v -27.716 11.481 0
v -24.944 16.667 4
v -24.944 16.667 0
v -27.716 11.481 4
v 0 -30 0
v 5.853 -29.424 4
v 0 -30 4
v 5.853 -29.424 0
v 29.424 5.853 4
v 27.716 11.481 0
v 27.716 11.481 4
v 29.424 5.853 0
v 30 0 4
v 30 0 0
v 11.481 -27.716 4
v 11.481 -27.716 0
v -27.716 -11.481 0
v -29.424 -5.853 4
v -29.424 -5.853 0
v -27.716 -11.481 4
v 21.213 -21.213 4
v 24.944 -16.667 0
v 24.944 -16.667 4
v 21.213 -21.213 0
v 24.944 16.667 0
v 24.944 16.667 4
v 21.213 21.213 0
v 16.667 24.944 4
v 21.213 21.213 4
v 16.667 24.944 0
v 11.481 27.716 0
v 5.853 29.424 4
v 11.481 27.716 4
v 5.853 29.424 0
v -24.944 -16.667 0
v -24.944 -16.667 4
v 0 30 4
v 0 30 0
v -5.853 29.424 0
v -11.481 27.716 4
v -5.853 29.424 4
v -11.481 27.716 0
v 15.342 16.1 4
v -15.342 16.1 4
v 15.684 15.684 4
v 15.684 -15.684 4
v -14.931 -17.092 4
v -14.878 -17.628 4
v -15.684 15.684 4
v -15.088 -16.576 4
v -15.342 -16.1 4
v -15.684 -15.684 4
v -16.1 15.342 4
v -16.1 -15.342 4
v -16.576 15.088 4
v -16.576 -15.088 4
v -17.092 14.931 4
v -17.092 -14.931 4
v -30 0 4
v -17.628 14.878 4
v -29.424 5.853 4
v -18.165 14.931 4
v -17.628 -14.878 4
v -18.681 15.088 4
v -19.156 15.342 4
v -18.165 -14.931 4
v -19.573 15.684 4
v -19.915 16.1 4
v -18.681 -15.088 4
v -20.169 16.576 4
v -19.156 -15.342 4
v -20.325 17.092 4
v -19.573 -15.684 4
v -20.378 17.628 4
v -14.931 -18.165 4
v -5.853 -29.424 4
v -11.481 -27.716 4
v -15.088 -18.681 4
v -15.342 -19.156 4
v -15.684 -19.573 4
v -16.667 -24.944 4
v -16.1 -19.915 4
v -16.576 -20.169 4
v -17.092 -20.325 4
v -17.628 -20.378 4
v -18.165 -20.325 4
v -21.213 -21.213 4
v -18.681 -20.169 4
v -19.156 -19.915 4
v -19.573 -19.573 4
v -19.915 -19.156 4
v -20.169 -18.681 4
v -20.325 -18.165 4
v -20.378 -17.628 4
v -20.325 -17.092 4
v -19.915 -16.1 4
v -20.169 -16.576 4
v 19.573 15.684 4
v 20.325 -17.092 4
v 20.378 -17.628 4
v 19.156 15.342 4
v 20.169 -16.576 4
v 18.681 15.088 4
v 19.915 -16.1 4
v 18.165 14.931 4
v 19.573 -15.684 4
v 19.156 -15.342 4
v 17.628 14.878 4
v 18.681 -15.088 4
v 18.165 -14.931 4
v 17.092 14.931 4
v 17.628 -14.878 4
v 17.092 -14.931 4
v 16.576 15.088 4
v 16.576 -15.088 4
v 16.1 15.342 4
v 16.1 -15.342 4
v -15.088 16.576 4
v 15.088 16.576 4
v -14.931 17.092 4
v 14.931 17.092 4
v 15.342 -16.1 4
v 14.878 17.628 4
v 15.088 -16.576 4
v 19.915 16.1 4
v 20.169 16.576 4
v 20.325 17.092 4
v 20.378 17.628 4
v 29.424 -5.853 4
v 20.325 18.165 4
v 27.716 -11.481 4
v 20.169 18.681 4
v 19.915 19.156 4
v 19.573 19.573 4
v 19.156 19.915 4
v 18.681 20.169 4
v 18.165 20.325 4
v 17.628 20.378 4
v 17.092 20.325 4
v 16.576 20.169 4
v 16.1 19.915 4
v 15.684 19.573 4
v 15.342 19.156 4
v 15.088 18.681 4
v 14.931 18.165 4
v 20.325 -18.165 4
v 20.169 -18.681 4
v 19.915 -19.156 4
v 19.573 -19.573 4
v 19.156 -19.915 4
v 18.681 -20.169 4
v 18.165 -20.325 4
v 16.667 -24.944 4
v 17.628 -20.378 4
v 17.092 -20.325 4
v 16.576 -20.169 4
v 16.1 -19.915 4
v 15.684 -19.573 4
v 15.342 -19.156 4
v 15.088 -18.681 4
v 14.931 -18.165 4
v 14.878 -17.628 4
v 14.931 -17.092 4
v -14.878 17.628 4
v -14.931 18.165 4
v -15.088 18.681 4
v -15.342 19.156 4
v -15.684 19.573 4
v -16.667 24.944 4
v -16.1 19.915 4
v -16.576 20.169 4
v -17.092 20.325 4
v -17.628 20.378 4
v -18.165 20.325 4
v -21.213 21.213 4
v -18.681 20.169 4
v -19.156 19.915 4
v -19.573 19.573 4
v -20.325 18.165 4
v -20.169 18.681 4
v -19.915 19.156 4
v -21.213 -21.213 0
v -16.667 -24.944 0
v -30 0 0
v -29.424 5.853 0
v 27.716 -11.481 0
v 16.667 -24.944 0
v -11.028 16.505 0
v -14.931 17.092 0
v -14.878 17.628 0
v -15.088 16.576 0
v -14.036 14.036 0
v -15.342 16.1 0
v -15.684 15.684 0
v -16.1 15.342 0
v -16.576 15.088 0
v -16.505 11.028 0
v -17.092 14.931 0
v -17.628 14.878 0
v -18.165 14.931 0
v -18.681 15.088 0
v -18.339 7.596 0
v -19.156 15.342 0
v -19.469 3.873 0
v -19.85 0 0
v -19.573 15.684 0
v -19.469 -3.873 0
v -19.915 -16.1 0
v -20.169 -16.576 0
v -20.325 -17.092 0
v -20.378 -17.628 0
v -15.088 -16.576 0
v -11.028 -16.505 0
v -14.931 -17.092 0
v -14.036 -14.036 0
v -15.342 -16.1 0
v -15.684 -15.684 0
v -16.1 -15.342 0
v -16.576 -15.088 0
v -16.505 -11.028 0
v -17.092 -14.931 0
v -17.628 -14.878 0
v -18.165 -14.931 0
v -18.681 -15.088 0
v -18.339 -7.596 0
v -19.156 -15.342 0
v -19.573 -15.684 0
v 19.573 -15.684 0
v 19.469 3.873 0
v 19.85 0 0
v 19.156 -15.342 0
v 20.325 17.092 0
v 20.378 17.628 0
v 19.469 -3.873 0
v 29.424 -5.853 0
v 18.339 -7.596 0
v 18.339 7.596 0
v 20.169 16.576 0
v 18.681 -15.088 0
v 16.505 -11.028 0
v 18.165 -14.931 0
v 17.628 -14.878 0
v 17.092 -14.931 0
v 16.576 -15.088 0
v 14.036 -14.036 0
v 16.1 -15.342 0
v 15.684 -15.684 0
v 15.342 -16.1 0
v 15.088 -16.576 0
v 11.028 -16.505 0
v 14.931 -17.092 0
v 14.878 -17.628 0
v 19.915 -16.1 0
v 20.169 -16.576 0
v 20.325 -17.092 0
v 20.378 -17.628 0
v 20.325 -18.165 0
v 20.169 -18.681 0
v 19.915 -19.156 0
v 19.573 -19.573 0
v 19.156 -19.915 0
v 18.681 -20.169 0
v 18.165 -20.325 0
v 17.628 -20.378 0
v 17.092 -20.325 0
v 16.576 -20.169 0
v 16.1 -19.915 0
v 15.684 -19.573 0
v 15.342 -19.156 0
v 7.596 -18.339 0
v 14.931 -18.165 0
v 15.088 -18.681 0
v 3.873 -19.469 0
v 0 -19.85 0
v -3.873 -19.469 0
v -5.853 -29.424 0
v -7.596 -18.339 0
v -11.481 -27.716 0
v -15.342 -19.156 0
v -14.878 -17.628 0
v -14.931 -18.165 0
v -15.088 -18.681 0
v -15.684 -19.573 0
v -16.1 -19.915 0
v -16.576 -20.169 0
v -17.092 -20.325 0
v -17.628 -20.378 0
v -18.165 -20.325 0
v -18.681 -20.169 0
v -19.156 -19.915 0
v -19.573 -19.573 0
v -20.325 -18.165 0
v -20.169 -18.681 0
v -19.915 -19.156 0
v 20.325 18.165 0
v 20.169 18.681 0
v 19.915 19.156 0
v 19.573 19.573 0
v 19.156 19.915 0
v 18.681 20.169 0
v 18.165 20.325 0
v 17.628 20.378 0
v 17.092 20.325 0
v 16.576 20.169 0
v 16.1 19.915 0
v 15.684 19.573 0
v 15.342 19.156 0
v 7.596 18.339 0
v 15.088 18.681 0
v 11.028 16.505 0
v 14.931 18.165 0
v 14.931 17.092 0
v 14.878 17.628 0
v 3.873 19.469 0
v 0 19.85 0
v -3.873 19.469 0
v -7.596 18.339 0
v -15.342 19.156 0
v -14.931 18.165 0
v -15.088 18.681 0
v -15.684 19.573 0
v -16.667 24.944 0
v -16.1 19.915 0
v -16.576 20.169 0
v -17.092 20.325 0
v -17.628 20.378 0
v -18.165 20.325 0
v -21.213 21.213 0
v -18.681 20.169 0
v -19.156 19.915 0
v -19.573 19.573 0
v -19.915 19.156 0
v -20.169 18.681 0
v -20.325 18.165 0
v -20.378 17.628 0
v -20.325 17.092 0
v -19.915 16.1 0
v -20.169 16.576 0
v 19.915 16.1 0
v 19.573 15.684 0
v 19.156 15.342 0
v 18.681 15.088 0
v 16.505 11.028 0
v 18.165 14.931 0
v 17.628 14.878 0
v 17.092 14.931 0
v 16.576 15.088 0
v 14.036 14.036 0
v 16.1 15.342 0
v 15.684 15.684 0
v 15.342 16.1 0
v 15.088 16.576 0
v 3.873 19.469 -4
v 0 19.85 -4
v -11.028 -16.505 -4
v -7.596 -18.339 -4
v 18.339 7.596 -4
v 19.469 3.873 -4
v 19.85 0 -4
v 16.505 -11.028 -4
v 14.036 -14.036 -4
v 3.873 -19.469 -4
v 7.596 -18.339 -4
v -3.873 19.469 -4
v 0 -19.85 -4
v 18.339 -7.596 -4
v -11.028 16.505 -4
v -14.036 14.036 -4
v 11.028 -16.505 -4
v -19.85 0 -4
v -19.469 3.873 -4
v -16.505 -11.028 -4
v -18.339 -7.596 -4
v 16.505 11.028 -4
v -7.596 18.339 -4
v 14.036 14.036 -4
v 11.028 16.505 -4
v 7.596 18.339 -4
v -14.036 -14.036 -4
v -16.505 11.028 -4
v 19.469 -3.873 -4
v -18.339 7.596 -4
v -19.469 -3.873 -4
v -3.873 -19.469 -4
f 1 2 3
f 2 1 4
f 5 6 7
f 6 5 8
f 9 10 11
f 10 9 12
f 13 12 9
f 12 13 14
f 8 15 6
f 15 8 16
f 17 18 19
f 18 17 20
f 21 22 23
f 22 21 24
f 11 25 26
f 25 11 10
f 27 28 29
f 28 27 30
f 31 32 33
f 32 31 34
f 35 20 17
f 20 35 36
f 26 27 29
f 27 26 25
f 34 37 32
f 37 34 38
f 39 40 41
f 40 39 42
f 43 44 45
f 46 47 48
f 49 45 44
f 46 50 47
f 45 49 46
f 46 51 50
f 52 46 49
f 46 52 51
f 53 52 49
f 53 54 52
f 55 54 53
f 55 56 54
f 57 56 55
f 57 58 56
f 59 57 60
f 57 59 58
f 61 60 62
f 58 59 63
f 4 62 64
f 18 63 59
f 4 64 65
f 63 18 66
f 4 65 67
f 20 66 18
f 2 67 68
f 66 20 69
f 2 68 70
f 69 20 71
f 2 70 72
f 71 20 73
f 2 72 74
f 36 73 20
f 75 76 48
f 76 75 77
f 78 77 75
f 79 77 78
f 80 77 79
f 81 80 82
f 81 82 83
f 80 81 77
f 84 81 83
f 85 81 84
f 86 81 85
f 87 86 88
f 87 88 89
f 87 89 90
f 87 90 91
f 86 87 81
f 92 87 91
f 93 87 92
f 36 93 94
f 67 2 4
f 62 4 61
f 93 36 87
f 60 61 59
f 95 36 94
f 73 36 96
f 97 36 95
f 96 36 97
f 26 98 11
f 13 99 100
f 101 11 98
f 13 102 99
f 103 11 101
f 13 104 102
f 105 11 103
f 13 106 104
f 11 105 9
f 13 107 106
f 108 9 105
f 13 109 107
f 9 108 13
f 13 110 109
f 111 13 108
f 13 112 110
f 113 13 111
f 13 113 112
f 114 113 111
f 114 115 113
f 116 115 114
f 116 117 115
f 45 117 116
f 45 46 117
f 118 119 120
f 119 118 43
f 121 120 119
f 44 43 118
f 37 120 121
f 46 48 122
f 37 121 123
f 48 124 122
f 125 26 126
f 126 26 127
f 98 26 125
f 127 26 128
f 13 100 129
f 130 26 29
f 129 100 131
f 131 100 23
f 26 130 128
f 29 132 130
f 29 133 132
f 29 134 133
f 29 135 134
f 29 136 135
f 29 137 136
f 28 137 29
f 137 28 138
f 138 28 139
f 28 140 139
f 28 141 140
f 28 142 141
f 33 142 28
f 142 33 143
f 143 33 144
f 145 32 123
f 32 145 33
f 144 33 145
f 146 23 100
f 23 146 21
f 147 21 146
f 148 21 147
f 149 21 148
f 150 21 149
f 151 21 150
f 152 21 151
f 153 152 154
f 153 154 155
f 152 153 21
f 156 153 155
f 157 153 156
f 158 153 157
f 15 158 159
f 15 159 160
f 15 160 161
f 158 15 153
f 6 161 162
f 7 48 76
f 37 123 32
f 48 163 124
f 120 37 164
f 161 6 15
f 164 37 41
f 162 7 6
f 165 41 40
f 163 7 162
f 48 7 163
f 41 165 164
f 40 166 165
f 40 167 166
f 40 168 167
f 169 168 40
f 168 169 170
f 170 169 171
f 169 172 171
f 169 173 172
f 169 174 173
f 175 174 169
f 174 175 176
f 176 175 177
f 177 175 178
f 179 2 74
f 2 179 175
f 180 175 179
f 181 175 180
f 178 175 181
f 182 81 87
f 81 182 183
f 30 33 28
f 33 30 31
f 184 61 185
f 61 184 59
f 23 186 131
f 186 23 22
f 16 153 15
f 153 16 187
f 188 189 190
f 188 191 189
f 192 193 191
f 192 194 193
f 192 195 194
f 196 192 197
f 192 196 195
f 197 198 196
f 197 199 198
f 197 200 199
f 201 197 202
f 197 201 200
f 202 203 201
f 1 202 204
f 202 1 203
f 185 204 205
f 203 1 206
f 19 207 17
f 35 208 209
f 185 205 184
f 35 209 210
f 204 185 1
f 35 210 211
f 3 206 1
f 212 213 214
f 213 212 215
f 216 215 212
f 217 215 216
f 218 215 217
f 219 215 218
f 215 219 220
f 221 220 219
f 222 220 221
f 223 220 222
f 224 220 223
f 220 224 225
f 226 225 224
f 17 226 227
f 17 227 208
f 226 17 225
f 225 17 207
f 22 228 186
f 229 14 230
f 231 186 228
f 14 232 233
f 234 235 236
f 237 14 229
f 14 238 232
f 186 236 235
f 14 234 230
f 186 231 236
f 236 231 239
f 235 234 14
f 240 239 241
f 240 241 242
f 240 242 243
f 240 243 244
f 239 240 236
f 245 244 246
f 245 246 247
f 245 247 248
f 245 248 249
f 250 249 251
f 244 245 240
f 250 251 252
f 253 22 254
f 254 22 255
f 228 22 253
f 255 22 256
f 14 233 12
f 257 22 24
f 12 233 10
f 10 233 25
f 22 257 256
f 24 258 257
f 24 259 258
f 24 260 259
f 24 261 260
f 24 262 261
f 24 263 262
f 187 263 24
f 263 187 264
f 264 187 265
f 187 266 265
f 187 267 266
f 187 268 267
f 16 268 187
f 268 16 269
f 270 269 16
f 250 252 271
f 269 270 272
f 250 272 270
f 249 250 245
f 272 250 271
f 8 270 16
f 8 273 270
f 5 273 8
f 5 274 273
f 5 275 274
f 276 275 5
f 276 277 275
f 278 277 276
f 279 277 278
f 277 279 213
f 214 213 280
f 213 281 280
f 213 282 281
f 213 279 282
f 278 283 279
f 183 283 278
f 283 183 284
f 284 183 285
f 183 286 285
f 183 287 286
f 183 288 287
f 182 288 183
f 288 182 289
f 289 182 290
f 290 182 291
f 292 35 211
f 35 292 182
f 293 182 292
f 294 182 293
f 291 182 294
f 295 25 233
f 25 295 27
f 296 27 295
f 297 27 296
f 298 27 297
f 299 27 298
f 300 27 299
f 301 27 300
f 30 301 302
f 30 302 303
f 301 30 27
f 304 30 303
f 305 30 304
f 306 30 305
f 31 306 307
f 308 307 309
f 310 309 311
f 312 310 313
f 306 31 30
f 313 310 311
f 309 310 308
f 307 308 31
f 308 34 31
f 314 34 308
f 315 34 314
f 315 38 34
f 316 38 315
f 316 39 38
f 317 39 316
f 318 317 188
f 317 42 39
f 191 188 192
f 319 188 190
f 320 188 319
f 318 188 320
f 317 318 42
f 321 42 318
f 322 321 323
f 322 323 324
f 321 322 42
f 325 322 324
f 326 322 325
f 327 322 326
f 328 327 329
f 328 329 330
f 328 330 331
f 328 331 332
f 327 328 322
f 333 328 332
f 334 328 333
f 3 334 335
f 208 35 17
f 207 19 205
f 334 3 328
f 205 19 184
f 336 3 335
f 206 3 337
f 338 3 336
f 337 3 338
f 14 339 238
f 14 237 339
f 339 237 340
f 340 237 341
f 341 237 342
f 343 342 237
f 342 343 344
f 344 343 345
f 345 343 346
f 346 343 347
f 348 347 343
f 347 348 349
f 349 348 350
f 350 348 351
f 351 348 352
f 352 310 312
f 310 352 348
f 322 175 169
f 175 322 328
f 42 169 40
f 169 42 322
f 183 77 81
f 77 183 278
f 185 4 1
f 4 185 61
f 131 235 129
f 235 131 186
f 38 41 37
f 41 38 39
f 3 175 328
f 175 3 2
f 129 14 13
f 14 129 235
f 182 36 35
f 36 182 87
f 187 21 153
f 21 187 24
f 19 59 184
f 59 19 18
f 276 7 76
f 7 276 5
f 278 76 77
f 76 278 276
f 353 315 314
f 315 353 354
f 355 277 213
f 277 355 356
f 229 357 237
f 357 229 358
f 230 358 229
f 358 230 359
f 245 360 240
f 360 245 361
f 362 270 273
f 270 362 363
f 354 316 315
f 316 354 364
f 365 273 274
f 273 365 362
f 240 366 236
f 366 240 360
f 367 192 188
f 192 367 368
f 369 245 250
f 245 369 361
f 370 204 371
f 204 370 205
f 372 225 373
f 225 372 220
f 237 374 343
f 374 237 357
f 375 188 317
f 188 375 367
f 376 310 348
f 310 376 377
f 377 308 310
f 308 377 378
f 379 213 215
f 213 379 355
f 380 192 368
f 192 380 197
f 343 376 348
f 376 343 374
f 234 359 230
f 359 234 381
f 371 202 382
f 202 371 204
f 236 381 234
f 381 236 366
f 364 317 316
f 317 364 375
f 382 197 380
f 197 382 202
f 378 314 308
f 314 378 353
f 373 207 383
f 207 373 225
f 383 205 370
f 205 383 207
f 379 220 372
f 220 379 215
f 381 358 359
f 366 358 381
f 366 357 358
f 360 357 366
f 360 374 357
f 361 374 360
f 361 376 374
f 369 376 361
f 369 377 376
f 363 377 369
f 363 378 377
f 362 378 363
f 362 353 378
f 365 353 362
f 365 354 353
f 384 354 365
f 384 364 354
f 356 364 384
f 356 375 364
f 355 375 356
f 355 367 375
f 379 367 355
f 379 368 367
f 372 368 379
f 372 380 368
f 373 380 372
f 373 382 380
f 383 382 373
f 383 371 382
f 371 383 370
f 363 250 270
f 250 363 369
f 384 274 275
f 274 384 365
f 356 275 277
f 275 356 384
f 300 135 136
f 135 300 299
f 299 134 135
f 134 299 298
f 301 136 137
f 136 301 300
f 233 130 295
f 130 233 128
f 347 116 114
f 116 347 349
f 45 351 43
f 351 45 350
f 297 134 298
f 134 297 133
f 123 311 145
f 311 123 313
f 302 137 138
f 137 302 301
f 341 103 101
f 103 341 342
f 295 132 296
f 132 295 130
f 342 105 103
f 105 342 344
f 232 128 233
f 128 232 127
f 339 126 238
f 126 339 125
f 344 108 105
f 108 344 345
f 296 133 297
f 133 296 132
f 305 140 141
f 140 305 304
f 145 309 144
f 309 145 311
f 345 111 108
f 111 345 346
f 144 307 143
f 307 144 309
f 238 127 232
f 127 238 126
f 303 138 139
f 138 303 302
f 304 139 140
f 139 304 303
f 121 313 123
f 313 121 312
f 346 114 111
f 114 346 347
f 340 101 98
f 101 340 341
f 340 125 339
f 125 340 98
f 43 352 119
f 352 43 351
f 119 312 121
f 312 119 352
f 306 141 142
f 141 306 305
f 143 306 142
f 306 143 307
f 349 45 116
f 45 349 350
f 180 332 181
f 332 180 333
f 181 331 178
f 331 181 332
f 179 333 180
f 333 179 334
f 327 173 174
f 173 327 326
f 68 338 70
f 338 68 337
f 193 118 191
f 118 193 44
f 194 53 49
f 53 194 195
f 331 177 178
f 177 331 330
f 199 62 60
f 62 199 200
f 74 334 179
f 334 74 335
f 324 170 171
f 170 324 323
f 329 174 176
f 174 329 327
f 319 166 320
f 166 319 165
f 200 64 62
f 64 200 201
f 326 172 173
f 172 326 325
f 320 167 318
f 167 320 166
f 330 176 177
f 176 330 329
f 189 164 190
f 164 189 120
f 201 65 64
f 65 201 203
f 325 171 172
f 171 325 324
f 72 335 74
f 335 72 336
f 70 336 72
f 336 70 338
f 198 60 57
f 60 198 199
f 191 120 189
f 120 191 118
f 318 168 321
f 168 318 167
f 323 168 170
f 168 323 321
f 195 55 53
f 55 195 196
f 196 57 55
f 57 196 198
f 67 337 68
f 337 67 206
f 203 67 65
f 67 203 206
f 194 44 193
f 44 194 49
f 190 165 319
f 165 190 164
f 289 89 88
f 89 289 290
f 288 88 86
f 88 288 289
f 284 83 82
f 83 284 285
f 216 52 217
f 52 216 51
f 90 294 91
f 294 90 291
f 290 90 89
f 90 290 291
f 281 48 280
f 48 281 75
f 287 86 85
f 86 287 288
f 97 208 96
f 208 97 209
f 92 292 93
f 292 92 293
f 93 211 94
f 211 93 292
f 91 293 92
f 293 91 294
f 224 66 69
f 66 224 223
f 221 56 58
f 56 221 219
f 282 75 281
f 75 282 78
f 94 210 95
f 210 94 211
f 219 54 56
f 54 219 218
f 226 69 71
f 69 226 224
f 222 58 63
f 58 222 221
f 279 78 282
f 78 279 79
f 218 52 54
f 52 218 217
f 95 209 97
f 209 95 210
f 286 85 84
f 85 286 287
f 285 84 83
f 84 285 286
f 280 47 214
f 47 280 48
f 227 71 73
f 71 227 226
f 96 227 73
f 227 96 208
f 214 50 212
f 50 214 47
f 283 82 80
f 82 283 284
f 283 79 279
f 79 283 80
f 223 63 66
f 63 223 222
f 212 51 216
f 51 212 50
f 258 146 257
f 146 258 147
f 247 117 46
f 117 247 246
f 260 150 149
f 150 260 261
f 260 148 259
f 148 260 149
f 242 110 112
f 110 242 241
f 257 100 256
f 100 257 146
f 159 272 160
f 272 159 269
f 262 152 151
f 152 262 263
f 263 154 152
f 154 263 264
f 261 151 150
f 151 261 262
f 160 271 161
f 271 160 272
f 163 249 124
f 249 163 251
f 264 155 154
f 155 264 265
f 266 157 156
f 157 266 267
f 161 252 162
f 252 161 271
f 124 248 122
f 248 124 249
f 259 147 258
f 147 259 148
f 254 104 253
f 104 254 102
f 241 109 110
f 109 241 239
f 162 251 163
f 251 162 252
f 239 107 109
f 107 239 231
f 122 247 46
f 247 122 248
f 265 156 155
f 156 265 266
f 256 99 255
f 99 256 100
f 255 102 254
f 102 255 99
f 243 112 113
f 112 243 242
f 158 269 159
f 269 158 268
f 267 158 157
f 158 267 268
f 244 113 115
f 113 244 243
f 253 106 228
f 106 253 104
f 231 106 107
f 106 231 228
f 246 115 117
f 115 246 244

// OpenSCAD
$fn = 32;

// ----------------------------------------------------------------------
// Retaining cap: 6203 cover, 60 mm, spigot 39.7 mm
// ----------------------------------------------------------------------

// --- parameters (mm) ---
cover_d = 60;             // cover diameter
cover_t = 4;              // cover thickness
spigot_d = 39.7;          // spigot that enters the housing
spigot_h = 4;             // spigot height
bolt_d = 5.5;             // bolt clearance
bolt_r = 24.93;           // bolt circle radius

module cover() {
  cylinder(h = cover_t, d = cover_d);
}

module spigot() {
  /* sunk 1 mm into the cover; the spigot sets the overall height */
  translate([0, 0, -spigot_h]) cylinder(h = spigot_h + 1, d = spigot_d);
}

difference() {
  union() {
    cover();
    spigot();
  }
  for (i = [0 : 3]) rotate([0, 0, 45 + i * 90]) translate([bolt_r, 0, -spigot_h - 1])
    cylinder(h = spigot_h + cover_t + 2, d = bolt_d);
}
